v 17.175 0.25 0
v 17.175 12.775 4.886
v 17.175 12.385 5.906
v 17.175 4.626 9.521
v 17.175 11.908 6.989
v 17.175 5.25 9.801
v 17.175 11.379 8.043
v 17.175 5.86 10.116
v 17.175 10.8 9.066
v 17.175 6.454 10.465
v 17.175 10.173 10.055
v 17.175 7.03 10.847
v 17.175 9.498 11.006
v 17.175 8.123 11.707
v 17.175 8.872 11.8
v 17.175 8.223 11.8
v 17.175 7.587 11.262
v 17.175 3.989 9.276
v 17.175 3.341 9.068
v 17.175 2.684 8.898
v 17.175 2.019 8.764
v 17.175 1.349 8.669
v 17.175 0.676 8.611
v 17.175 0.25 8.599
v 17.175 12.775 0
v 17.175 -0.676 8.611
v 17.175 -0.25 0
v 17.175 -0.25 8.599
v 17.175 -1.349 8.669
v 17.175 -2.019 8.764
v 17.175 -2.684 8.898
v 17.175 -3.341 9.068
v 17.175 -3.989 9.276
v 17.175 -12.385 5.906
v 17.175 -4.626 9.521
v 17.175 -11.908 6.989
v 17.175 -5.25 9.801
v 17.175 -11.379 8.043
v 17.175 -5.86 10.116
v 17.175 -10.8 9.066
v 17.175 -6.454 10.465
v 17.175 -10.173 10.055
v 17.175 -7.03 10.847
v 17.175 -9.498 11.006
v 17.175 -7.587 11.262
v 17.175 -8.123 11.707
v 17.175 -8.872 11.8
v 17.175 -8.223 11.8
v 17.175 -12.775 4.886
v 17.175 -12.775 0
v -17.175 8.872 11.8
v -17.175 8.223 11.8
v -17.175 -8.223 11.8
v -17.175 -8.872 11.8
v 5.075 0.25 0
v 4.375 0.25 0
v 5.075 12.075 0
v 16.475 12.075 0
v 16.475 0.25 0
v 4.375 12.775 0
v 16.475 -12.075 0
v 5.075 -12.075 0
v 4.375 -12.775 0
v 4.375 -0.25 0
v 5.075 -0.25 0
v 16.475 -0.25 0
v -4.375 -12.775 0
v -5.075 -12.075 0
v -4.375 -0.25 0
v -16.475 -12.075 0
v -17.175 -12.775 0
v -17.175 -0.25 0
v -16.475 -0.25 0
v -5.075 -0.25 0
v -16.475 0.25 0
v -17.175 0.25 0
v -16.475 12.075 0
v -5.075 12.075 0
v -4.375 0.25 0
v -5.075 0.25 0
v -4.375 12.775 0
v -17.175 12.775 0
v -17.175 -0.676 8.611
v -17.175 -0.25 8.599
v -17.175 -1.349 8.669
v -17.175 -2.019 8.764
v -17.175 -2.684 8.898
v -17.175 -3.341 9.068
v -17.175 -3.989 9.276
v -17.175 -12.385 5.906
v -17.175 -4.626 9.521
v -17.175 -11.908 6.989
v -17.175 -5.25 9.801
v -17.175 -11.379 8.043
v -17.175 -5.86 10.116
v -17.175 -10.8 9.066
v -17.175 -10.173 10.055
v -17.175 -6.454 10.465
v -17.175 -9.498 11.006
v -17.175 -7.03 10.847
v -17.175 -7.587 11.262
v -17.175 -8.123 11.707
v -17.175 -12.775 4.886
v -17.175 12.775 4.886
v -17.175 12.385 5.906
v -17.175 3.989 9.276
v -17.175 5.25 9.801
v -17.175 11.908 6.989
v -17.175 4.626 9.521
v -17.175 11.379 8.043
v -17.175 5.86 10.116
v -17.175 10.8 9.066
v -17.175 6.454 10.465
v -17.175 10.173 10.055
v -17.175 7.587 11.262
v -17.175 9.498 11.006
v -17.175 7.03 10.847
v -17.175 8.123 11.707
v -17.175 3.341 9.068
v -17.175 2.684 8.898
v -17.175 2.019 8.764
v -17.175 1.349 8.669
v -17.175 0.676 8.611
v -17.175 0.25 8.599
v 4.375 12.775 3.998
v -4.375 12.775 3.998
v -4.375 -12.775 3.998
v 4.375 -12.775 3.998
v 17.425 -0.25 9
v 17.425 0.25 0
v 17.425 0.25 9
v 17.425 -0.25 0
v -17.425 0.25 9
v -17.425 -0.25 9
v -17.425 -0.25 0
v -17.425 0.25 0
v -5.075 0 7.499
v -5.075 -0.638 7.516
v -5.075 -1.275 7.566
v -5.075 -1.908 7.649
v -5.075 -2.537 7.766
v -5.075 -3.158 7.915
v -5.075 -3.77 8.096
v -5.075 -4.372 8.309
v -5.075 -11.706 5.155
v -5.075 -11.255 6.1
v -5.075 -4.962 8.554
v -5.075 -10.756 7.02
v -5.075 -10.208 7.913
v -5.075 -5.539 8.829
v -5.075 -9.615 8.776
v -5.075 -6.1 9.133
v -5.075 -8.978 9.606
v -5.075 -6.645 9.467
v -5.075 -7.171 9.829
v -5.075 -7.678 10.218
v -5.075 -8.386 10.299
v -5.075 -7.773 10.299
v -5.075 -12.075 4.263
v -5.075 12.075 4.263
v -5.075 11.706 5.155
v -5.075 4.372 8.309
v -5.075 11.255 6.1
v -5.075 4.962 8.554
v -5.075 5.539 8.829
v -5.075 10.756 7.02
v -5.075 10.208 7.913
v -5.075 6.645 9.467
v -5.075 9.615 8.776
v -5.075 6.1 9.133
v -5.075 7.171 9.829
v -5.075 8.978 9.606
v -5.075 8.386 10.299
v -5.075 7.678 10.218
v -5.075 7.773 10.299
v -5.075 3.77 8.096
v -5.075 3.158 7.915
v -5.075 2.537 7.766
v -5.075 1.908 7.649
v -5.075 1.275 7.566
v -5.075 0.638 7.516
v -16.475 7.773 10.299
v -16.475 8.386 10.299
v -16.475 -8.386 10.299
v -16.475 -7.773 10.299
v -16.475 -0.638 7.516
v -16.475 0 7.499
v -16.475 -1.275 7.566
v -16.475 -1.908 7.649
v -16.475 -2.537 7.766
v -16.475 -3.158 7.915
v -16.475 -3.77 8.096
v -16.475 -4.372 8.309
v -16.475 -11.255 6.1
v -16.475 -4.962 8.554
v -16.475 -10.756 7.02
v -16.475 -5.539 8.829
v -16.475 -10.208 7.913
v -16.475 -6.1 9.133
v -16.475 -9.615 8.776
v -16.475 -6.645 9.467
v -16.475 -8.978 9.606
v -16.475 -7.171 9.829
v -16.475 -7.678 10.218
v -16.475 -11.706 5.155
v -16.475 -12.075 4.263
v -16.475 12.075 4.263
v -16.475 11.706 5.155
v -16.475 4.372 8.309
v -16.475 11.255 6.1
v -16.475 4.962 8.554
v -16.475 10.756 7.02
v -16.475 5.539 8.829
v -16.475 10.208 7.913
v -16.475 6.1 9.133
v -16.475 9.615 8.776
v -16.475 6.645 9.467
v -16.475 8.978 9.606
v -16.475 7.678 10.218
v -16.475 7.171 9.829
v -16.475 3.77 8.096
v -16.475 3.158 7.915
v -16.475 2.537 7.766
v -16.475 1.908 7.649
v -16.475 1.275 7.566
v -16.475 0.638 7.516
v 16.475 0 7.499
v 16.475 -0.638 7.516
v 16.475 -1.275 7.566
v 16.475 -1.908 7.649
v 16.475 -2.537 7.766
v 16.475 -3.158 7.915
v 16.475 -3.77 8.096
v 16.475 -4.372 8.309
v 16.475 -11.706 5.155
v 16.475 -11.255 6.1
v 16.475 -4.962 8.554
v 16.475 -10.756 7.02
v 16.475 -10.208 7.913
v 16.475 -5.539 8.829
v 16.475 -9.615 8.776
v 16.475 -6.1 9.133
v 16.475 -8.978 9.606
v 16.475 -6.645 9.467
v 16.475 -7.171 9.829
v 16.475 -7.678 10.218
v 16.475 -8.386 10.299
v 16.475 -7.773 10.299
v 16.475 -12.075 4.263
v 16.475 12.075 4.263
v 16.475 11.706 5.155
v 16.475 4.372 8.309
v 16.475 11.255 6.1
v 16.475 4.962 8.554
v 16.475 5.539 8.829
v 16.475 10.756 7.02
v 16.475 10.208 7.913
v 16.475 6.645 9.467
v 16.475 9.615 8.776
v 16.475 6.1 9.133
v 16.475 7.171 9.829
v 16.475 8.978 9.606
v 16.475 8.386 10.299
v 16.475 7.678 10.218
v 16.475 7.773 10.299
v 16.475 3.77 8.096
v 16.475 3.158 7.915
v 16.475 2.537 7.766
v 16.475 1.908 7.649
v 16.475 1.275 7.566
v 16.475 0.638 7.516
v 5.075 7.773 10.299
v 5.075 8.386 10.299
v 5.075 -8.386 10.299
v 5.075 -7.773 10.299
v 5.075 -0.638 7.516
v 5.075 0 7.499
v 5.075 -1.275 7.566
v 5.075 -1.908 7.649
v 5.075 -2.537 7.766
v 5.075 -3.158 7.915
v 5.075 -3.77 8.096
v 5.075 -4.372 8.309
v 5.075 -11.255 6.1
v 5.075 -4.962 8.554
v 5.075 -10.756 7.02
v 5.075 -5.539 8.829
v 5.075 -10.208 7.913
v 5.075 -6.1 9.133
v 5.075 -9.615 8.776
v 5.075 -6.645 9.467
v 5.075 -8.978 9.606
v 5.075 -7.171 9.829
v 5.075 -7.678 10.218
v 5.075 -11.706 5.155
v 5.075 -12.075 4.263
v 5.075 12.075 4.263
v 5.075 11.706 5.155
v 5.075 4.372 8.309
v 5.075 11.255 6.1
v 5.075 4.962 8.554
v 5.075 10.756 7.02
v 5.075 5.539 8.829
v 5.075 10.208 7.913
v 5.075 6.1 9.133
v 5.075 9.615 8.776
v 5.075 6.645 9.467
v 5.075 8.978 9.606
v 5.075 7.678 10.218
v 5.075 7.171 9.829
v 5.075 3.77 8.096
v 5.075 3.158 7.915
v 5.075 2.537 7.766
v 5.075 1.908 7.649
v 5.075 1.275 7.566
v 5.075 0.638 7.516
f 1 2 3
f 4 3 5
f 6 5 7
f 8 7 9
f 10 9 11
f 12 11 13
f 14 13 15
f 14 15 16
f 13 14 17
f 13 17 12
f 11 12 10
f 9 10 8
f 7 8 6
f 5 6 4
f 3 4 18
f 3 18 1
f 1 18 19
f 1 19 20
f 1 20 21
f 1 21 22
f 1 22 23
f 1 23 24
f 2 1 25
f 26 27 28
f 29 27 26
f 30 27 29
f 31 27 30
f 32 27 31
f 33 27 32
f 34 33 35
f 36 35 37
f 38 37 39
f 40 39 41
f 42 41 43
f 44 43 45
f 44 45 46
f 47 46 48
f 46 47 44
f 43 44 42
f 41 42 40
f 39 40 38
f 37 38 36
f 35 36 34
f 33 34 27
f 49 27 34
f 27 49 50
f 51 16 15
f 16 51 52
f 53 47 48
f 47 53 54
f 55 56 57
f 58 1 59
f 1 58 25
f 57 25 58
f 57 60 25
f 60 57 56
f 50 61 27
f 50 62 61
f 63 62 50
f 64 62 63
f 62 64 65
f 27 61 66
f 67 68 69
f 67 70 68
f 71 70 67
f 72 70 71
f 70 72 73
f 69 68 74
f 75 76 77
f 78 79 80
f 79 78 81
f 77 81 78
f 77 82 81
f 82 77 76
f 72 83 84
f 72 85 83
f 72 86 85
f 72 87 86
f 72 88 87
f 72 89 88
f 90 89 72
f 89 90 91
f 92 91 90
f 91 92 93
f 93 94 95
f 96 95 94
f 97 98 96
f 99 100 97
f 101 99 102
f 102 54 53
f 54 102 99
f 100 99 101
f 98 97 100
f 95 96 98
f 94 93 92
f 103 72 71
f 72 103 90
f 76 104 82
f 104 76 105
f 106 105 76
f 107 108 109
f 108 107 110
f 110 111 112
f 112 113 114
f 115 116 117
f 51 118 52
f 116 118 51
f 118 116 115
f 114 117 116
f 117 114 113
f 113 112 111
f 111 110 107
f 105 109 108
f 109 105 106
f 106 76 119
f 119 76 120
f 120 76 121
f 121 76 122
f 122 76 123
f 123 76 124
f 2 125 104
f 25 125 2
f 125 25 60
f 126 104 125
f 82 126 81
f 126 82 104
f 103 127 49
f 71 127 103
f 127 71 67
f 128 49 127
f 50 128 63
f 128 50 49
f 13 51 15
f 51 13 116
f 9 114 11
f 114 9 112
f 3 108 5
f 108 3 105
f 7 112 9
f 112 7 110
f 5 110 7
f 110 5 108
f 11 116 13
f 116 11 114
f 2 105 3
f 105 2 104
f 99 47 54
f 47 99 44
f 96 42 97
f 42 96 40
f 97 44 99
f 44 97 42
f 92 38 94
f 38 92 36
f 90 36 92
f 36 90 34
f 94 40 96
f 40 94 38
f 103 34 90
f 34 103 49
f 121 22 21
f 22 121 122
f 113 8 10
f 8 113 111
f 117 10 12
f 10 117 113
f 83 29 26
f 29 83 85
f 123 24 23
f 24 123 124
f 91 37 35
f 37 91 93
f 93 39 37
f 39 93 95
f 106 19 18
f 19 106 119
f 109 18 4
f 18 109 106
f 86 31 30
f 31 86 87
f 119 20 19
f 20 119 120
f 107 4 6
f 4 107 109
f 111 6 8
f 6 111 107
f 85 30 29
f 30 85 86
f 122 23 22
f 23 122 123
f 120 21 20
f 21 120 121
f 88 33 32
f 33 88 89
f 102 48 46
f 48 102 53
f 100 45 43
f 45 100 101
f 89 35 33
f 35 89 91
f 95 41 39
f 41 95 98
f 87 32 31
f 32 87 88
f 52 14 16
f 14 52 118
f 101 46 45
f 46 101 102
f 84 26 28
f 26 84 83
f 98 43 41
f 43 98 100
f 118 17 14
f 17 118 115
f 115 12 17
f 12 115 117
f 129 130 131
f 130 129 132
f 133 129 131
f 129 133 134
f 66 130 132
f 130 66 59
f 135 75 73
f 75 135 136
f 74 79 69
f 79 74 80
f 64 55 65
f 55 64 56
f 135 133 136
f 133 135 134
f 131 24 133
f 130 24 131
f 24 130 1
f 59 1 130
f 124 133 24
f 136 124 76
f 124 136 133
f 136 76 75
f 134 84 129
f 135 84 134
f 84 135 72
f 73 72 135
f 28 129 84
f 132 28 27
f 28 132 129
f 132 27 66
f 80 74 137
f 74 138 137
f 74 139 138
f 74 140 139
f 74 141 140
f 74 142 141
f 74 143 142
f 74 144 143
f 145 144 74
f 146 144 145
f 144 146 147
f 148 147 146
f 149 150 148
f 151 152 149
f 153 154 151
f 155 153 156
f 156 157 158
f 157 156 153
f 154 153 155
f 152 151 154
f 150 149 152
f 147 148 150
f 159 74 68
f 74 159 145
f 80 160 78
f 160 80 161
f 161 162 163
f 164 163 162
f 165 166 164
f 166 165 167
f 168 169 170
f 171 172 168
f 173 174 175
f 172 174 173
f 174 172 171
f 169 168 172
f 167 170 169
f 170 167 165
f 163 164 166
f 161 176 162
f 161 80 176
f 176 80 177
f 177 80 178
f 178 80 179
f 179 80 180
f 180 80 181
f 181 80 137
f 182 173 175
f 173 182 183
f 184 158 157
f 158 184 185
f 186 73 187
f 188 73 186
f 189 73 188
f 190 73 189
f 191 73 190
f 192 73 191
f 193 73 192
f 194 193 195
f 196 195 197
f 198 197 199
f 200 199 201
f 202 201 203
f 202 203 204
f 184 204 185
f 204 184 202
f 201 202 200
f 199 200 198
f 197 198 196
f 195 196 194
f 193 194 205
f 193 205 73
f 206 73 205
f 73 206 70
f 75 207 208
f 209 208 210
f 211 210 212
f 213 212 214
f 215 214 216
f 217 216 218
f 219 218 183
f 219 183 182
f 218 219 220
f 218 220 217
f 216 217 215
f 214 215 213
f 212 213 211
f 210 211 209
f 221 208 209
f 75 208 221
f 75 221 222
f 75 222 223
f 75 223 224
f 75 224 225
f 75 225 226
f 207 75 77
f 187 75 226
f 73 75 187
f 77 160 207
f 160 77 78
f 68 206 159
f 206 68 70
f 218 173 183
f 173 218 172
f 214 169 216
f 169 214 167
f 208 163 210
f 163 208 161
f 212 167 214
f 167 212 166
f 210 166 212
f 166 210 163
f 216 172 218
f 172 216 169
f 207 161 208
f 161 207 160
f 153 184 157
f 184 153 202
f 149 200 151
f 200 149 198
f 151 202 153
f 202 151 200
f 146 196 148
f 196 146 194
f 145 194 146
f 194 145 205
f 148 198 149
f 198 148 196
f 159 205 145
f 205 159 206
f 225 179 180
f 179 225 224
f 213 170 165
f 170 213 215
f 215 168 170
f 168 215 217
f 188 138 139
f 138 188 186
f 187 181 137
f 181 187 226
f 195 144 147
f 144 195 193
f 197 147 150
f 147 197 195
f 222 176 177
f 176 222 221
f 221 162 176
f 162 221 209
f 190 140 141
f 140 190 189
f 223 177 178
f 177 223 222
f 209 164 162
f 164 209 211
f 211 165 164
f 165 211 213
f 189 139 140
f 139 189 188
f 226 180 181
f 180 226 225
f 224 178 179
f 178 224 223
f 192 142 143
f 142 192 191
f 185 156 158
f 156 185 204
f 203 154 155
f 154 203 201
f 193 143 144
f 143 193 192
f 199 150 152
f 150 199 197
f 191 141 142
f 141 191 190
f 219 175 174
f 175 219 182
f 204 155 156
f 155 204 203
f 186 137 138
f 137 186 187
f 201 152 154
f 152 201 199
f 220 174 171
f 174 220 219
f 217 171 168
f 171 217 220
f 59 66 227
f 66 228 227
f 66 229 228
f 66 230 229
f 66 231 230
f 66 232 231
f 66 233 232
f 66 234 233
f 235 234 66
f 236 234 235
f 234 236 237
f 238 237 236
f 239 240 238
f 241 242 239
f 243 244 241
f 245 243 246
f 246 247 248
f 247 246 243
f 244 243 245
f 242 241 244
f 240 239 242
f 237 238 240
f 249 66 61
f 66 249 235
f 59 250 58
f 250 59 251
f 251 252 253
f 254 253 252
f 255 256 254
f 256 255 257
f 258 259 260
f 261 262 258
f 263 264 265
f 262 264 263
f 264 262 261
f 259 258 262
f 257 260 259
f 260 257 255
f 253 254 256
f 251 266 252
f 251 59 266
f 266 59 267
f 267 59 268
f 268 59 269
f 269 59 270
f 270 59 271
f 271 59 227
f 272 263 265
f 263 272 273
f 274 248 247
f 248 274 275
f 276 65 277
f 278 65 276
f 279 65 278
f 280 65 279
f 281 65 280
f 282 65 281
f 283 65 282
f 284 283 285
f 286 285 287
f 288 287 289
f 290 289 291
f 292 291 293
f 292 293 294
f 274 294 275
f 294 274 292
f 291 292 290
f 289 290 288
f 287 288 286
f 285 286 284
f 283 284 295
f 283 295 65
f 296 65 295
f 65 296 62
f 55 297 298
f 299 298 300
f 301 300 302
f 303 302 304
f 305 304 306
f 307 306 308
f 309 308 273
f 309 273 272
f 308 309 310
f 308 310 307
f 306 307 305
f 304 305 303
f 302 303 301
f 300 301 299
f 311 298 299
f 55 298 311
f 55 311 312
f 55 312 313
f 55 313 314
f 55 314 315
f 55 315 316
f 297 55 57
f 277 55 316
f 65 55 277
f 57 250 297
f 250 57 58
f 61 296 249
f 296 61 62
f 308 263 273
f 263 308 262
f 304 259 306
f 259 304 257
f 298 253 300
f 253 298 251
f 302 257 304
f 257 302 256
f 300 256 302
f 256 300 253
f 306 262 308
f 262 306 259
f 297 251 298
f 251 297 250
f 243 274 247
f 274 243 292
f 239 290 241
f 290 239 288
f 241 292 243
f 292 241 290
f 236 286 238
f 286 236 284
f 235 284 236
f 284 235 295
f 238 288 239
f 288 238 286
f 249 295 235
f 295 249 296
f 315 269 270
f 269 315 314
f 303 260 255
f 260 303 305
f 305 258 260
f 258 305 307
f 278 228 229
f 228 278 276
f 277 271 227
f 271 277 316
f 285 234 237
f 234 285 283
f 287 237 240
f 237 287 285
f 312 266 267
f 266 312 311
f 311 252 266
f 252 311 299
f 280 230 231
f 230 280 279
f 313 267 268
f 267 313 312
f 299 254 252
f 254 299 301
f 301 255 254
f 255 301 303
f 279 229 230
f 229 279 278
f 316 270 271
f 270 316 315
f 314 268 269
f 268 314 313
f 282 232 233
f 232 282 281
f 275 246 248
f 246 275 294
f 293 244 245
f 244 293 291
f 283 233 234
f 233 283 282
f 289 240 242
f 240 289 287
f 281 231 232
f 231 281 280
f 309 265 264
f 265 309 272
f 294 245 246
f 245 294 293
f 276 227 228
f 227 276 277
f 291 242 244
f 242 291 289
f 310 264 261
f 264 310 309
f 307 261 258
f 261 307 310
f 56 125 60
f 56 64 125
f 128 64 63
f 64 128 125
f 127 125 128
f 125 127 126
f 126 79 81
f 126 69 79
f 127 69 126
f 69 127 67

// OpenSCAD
//  Fader coupler – for coupling together individual channel faders of a stereo bus, or coupling together two mono channel faders to create a stereo channel pair.

//  I recommend making a "working copy" of the file for tinkering! See the license below if you're releasing any modified versions of your own.

//  Created by Lauri "Archyx" Lindholm in 2023 to solve a practical problem.
//  Released in 2023-05-29 under Creative Commons Attribution-ShareAlike 4.0 License.

//  https://creativecommons.org/licenses/by-sa/4.0/

//  The original default values provide a fit for Soundcraft fx16ii faders. There are two values for fader_distance to fit couplers on (narrower) bus faders and (wider) channel faders.

//  The two values below affect rendering quality in OpenSCAD. Refer to OpenSCAD manual if you wish to change them.
$fa = 3;
$fs = 0.25;

//  === source measurements =================================================

//  All source measurements are in millimeters.

//  fader knob size – these should be measured from the mixer's fader knobs accurately enough to make a snug fit but not too loose or tight!
fader_knob_width   = 11.4;
fader_knob_length  = 24.15;
fader_knob_height  = 10.3;  //  from the flat of the bottom to the highest points.
//  ^^^^^^^^^^^^^ This defines how deep the fader knob sinks into the coupler.

//  radius of a circle that makes the front/back curve of the fader knob – this was achieved experimentally. As long as there's enough room under the coupler to fit the fader knob, it'll be good.
fader_knob_fb_radius = 20;

//  radius of a circle that makes the dip for the finger on top of the fader knob – another experimental value. Once again, it doesn't matter if there's a little bit too much room left.
fader_knob_dip_radius = 12.2;
//  the depth of the dip – this is a rough measurement. As long as the coupler's dip is shallower than the actual fader knob, the knob can evenly bottom out under the coupler.
fader_knob_dip_depth  = 2.8;

//  space around fader knobs, ie. maximum allowed distance from the fader knob to avoid collisions to other controls
space_around       = 0.7;


////  fader distance between left and right bus faders:
////  (width of steel between fader cutouts + the width of _one_ fader track cutout)
//fader_distance     = 10.7 + 3.2;
////space_under        = 3.7 + 0.3;  // this gap is optional for the bus faders


//  fader distance between channel faders:
fader_distance     = 18.35 + 3.2;
//  height of buttons or other controls between faders, measured from face plate (can be left undefined if not needed):
space_under        = 3.7 + 0.3;  // max. height of buttons + additional tolerance

//  === end of source measurements ==========================================

//  The outer dimensions of a shell that fits over a _single_ fader knob. These may need to be modified if the target mixer dimensions are wildly different compared to the unit the couplers were originally developed for.

coupler_width = fader_knob_width + (2 * space_around);
coupler_length = fader_knob_length + (2 * space_around);
coupler_height = fader_knob_height + 1.5;


module fader_knob (fWidth, fLength, fHeight, fRadius, fDipRadius, fDipDepth) {
//  An approximation of a fader knob for the outside shape and the cavity inside the coupler
    difference() {
        intersection() {
            cube([fWidth, fLength, fHeight], center = true);
            translate([0, (fRadius - 1.1 * fLength), (fHeight - fRadius + PI / 2)])
                rotate([0, 90, 0])
                    cylinder(h = fWidth, r = fRadius, center = true);
            translate([0, (1.1 * fLength - fRadius), (fHeight - fRadius + PI / 2)])
                rotate([0, 90, 0])
                    cylinder(h = fWidth, r = fRadius, center = true);
        }
        translate([0, 0, (fDipRadius + fHeight / 2) - fDipDepth])
            rotate([0, 90, 0])
                cylinder(h = fWidth + 0.001, r = fDipRadius, center = true);
    }
 }

//  the main thing
difference() {
    union() {
        //  The fader coupler basic shape, this is basically a slightly upscaled and wider version of the fader knob.
        translate([0, 0, coupler_height / 2])
            resize([fader_distance + coupler_width, coupler_length, coupler_height])
                fader_knob(fader_knob_width, fader_knob_length, fader_knob_height, fader_knob_fb_radius, fader_knob_dip_radius, fader_knob_dip_depth);
        //  fader reference line in the middle with 0.5 mm protrusion
        translate([0, 0, (coupler_height - fader_knob_dip_depth) / 2])
            cube([fader_distance + coupler_width + 0.5, 0.5, coupler_height - fader_knob_dip_depth], center = true);
    }
    
    translate([0, 0, -0.001]) {  //  the hollow things on the underside
    //  left fader
    translate([-(fader_distance / 2), 0, fader_knob_height / 2])
        fader_knob(fader_knob_width, fader_knob_length, fader_knob_height, fader_knob_fb_radius, fader_knob_dip_radius, fader_knob_dip_depth);
    //  right fader
    translate([(fader_distance / 2), 0, fader_knob_height / 2])
        fader_knob(fader_knob_width, fader_knob_length, fader_knob_height, fader_knob_fb_radius, fader_knob_dip_radius, fader_knob_dip_depth);
    //  bridge over buttons, ignored if space_under is not defined
    if (!is_undef(space_under))
        translate([0, 0, space_under / 2 - 0.001])
            cube([fader_distance - fader_knob_width - 2 * space_around, coupler_length + 0.001, space_under], center = true);
    }
}

//  Uncomment the rest of the script to render the fader knob objects used to subtract the space under the coupler to fit the couplers onto the mixer fader knobs, for visual reference next to the coupler. There is no reason to include them in the final printed object!

////  the fader equivalents
//translate([0, 30, 0]) {
//    //  left fader
//    translate([-(fader_distance / 2), 0, fader_knob_height / 2])
//        fader_knob(fader_knob_width, fader_knob_length, fader_knob_height, fader_knob_fb_radius, fader_knob_dip_radius, fader_knob_dip_depth);
//    //  right fader
//    translate([(fader_distance / 2), 0, fader_knob_height / 2])
//        fader_knob(fader_knob_width, fader_knob_length, fader_knob_height, fader_knob_fb_radius, fader_knob_dip_radius, fader_knob_dip_depth);
//}
